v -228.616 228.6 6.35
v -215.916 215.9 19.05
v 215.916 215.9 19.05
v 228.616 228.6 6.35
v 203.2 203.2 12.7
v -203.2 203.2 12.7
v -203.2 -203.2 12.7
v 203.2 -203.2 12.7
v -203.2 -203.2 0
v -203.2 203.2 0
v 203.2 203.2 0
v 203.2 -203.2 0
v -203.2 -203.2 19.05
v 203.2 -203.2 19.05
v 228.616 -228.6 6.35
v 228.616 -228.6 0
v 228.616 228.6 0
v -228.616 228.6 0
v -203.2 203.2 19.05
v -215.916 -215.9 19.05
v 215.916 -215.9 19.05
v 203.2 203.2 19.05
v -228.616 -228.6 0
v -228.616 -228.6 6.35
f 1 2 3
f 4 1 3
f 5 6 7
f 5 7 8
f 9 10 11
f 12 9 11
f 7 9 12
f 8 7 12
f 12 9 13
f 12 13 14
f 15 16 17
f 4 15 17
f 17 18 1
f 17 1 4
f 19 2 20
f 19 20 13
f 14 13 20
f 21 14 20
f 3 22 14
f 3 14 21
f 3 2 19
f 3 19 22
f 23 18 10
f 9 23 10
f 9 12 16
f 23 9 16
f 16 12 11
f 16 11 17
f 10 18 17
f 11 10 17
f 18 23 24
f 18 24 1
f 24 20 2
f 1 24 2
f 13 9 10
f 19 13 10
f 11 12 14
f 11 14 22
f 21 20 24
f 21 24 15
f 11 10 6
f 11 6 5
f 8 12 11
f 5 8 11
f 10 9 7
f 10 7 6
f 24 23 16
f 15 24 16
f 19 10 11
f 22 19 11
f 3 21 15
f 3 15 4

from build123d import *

# Parameters (mm, degrees)
F2_W     = 406.4
F2_H     = 406.4
F3_DEPTH = 12.7
F0_W     = 457.2328
F0_H     = 457.2
F0_W_2   = 406.4
F0_H_2   = 406.4
F4_DEPTH = 19.05
F1_SIZE  = 12.7


with BuildPart() as f3:
    # F2 (on Top) → F3 (new body)
    with BuildSketch(Plane.XY):
        Rectangle(F2_W, F2_H)
    extrude(amount=F3_DEPTH)


with BuildPart() as f4:
    # F0 (on face) → F4 (new body)
    with BuildSketch(Plane.XY):
        Rectangle(F0_W, F0_H)
        Rectangle(F0_W_2, F0_H_2, mode=Mode.SUBTRACT)
    extrude(amount=F4_DEPTH)

    # F1
    f1_edges = [f4.edges().sort_by_distance(p)[0] for p in [
        (0, -228.6, 19.05),
        (-228.6164, 0, 19.05),
        (228.6164, 0, 19.05),
        (0, 228.6, 19.05),
    ]]
    chamfer(f1_edges, length=F1_SIZE)


solid = Compound([f3.part, f4.part])
